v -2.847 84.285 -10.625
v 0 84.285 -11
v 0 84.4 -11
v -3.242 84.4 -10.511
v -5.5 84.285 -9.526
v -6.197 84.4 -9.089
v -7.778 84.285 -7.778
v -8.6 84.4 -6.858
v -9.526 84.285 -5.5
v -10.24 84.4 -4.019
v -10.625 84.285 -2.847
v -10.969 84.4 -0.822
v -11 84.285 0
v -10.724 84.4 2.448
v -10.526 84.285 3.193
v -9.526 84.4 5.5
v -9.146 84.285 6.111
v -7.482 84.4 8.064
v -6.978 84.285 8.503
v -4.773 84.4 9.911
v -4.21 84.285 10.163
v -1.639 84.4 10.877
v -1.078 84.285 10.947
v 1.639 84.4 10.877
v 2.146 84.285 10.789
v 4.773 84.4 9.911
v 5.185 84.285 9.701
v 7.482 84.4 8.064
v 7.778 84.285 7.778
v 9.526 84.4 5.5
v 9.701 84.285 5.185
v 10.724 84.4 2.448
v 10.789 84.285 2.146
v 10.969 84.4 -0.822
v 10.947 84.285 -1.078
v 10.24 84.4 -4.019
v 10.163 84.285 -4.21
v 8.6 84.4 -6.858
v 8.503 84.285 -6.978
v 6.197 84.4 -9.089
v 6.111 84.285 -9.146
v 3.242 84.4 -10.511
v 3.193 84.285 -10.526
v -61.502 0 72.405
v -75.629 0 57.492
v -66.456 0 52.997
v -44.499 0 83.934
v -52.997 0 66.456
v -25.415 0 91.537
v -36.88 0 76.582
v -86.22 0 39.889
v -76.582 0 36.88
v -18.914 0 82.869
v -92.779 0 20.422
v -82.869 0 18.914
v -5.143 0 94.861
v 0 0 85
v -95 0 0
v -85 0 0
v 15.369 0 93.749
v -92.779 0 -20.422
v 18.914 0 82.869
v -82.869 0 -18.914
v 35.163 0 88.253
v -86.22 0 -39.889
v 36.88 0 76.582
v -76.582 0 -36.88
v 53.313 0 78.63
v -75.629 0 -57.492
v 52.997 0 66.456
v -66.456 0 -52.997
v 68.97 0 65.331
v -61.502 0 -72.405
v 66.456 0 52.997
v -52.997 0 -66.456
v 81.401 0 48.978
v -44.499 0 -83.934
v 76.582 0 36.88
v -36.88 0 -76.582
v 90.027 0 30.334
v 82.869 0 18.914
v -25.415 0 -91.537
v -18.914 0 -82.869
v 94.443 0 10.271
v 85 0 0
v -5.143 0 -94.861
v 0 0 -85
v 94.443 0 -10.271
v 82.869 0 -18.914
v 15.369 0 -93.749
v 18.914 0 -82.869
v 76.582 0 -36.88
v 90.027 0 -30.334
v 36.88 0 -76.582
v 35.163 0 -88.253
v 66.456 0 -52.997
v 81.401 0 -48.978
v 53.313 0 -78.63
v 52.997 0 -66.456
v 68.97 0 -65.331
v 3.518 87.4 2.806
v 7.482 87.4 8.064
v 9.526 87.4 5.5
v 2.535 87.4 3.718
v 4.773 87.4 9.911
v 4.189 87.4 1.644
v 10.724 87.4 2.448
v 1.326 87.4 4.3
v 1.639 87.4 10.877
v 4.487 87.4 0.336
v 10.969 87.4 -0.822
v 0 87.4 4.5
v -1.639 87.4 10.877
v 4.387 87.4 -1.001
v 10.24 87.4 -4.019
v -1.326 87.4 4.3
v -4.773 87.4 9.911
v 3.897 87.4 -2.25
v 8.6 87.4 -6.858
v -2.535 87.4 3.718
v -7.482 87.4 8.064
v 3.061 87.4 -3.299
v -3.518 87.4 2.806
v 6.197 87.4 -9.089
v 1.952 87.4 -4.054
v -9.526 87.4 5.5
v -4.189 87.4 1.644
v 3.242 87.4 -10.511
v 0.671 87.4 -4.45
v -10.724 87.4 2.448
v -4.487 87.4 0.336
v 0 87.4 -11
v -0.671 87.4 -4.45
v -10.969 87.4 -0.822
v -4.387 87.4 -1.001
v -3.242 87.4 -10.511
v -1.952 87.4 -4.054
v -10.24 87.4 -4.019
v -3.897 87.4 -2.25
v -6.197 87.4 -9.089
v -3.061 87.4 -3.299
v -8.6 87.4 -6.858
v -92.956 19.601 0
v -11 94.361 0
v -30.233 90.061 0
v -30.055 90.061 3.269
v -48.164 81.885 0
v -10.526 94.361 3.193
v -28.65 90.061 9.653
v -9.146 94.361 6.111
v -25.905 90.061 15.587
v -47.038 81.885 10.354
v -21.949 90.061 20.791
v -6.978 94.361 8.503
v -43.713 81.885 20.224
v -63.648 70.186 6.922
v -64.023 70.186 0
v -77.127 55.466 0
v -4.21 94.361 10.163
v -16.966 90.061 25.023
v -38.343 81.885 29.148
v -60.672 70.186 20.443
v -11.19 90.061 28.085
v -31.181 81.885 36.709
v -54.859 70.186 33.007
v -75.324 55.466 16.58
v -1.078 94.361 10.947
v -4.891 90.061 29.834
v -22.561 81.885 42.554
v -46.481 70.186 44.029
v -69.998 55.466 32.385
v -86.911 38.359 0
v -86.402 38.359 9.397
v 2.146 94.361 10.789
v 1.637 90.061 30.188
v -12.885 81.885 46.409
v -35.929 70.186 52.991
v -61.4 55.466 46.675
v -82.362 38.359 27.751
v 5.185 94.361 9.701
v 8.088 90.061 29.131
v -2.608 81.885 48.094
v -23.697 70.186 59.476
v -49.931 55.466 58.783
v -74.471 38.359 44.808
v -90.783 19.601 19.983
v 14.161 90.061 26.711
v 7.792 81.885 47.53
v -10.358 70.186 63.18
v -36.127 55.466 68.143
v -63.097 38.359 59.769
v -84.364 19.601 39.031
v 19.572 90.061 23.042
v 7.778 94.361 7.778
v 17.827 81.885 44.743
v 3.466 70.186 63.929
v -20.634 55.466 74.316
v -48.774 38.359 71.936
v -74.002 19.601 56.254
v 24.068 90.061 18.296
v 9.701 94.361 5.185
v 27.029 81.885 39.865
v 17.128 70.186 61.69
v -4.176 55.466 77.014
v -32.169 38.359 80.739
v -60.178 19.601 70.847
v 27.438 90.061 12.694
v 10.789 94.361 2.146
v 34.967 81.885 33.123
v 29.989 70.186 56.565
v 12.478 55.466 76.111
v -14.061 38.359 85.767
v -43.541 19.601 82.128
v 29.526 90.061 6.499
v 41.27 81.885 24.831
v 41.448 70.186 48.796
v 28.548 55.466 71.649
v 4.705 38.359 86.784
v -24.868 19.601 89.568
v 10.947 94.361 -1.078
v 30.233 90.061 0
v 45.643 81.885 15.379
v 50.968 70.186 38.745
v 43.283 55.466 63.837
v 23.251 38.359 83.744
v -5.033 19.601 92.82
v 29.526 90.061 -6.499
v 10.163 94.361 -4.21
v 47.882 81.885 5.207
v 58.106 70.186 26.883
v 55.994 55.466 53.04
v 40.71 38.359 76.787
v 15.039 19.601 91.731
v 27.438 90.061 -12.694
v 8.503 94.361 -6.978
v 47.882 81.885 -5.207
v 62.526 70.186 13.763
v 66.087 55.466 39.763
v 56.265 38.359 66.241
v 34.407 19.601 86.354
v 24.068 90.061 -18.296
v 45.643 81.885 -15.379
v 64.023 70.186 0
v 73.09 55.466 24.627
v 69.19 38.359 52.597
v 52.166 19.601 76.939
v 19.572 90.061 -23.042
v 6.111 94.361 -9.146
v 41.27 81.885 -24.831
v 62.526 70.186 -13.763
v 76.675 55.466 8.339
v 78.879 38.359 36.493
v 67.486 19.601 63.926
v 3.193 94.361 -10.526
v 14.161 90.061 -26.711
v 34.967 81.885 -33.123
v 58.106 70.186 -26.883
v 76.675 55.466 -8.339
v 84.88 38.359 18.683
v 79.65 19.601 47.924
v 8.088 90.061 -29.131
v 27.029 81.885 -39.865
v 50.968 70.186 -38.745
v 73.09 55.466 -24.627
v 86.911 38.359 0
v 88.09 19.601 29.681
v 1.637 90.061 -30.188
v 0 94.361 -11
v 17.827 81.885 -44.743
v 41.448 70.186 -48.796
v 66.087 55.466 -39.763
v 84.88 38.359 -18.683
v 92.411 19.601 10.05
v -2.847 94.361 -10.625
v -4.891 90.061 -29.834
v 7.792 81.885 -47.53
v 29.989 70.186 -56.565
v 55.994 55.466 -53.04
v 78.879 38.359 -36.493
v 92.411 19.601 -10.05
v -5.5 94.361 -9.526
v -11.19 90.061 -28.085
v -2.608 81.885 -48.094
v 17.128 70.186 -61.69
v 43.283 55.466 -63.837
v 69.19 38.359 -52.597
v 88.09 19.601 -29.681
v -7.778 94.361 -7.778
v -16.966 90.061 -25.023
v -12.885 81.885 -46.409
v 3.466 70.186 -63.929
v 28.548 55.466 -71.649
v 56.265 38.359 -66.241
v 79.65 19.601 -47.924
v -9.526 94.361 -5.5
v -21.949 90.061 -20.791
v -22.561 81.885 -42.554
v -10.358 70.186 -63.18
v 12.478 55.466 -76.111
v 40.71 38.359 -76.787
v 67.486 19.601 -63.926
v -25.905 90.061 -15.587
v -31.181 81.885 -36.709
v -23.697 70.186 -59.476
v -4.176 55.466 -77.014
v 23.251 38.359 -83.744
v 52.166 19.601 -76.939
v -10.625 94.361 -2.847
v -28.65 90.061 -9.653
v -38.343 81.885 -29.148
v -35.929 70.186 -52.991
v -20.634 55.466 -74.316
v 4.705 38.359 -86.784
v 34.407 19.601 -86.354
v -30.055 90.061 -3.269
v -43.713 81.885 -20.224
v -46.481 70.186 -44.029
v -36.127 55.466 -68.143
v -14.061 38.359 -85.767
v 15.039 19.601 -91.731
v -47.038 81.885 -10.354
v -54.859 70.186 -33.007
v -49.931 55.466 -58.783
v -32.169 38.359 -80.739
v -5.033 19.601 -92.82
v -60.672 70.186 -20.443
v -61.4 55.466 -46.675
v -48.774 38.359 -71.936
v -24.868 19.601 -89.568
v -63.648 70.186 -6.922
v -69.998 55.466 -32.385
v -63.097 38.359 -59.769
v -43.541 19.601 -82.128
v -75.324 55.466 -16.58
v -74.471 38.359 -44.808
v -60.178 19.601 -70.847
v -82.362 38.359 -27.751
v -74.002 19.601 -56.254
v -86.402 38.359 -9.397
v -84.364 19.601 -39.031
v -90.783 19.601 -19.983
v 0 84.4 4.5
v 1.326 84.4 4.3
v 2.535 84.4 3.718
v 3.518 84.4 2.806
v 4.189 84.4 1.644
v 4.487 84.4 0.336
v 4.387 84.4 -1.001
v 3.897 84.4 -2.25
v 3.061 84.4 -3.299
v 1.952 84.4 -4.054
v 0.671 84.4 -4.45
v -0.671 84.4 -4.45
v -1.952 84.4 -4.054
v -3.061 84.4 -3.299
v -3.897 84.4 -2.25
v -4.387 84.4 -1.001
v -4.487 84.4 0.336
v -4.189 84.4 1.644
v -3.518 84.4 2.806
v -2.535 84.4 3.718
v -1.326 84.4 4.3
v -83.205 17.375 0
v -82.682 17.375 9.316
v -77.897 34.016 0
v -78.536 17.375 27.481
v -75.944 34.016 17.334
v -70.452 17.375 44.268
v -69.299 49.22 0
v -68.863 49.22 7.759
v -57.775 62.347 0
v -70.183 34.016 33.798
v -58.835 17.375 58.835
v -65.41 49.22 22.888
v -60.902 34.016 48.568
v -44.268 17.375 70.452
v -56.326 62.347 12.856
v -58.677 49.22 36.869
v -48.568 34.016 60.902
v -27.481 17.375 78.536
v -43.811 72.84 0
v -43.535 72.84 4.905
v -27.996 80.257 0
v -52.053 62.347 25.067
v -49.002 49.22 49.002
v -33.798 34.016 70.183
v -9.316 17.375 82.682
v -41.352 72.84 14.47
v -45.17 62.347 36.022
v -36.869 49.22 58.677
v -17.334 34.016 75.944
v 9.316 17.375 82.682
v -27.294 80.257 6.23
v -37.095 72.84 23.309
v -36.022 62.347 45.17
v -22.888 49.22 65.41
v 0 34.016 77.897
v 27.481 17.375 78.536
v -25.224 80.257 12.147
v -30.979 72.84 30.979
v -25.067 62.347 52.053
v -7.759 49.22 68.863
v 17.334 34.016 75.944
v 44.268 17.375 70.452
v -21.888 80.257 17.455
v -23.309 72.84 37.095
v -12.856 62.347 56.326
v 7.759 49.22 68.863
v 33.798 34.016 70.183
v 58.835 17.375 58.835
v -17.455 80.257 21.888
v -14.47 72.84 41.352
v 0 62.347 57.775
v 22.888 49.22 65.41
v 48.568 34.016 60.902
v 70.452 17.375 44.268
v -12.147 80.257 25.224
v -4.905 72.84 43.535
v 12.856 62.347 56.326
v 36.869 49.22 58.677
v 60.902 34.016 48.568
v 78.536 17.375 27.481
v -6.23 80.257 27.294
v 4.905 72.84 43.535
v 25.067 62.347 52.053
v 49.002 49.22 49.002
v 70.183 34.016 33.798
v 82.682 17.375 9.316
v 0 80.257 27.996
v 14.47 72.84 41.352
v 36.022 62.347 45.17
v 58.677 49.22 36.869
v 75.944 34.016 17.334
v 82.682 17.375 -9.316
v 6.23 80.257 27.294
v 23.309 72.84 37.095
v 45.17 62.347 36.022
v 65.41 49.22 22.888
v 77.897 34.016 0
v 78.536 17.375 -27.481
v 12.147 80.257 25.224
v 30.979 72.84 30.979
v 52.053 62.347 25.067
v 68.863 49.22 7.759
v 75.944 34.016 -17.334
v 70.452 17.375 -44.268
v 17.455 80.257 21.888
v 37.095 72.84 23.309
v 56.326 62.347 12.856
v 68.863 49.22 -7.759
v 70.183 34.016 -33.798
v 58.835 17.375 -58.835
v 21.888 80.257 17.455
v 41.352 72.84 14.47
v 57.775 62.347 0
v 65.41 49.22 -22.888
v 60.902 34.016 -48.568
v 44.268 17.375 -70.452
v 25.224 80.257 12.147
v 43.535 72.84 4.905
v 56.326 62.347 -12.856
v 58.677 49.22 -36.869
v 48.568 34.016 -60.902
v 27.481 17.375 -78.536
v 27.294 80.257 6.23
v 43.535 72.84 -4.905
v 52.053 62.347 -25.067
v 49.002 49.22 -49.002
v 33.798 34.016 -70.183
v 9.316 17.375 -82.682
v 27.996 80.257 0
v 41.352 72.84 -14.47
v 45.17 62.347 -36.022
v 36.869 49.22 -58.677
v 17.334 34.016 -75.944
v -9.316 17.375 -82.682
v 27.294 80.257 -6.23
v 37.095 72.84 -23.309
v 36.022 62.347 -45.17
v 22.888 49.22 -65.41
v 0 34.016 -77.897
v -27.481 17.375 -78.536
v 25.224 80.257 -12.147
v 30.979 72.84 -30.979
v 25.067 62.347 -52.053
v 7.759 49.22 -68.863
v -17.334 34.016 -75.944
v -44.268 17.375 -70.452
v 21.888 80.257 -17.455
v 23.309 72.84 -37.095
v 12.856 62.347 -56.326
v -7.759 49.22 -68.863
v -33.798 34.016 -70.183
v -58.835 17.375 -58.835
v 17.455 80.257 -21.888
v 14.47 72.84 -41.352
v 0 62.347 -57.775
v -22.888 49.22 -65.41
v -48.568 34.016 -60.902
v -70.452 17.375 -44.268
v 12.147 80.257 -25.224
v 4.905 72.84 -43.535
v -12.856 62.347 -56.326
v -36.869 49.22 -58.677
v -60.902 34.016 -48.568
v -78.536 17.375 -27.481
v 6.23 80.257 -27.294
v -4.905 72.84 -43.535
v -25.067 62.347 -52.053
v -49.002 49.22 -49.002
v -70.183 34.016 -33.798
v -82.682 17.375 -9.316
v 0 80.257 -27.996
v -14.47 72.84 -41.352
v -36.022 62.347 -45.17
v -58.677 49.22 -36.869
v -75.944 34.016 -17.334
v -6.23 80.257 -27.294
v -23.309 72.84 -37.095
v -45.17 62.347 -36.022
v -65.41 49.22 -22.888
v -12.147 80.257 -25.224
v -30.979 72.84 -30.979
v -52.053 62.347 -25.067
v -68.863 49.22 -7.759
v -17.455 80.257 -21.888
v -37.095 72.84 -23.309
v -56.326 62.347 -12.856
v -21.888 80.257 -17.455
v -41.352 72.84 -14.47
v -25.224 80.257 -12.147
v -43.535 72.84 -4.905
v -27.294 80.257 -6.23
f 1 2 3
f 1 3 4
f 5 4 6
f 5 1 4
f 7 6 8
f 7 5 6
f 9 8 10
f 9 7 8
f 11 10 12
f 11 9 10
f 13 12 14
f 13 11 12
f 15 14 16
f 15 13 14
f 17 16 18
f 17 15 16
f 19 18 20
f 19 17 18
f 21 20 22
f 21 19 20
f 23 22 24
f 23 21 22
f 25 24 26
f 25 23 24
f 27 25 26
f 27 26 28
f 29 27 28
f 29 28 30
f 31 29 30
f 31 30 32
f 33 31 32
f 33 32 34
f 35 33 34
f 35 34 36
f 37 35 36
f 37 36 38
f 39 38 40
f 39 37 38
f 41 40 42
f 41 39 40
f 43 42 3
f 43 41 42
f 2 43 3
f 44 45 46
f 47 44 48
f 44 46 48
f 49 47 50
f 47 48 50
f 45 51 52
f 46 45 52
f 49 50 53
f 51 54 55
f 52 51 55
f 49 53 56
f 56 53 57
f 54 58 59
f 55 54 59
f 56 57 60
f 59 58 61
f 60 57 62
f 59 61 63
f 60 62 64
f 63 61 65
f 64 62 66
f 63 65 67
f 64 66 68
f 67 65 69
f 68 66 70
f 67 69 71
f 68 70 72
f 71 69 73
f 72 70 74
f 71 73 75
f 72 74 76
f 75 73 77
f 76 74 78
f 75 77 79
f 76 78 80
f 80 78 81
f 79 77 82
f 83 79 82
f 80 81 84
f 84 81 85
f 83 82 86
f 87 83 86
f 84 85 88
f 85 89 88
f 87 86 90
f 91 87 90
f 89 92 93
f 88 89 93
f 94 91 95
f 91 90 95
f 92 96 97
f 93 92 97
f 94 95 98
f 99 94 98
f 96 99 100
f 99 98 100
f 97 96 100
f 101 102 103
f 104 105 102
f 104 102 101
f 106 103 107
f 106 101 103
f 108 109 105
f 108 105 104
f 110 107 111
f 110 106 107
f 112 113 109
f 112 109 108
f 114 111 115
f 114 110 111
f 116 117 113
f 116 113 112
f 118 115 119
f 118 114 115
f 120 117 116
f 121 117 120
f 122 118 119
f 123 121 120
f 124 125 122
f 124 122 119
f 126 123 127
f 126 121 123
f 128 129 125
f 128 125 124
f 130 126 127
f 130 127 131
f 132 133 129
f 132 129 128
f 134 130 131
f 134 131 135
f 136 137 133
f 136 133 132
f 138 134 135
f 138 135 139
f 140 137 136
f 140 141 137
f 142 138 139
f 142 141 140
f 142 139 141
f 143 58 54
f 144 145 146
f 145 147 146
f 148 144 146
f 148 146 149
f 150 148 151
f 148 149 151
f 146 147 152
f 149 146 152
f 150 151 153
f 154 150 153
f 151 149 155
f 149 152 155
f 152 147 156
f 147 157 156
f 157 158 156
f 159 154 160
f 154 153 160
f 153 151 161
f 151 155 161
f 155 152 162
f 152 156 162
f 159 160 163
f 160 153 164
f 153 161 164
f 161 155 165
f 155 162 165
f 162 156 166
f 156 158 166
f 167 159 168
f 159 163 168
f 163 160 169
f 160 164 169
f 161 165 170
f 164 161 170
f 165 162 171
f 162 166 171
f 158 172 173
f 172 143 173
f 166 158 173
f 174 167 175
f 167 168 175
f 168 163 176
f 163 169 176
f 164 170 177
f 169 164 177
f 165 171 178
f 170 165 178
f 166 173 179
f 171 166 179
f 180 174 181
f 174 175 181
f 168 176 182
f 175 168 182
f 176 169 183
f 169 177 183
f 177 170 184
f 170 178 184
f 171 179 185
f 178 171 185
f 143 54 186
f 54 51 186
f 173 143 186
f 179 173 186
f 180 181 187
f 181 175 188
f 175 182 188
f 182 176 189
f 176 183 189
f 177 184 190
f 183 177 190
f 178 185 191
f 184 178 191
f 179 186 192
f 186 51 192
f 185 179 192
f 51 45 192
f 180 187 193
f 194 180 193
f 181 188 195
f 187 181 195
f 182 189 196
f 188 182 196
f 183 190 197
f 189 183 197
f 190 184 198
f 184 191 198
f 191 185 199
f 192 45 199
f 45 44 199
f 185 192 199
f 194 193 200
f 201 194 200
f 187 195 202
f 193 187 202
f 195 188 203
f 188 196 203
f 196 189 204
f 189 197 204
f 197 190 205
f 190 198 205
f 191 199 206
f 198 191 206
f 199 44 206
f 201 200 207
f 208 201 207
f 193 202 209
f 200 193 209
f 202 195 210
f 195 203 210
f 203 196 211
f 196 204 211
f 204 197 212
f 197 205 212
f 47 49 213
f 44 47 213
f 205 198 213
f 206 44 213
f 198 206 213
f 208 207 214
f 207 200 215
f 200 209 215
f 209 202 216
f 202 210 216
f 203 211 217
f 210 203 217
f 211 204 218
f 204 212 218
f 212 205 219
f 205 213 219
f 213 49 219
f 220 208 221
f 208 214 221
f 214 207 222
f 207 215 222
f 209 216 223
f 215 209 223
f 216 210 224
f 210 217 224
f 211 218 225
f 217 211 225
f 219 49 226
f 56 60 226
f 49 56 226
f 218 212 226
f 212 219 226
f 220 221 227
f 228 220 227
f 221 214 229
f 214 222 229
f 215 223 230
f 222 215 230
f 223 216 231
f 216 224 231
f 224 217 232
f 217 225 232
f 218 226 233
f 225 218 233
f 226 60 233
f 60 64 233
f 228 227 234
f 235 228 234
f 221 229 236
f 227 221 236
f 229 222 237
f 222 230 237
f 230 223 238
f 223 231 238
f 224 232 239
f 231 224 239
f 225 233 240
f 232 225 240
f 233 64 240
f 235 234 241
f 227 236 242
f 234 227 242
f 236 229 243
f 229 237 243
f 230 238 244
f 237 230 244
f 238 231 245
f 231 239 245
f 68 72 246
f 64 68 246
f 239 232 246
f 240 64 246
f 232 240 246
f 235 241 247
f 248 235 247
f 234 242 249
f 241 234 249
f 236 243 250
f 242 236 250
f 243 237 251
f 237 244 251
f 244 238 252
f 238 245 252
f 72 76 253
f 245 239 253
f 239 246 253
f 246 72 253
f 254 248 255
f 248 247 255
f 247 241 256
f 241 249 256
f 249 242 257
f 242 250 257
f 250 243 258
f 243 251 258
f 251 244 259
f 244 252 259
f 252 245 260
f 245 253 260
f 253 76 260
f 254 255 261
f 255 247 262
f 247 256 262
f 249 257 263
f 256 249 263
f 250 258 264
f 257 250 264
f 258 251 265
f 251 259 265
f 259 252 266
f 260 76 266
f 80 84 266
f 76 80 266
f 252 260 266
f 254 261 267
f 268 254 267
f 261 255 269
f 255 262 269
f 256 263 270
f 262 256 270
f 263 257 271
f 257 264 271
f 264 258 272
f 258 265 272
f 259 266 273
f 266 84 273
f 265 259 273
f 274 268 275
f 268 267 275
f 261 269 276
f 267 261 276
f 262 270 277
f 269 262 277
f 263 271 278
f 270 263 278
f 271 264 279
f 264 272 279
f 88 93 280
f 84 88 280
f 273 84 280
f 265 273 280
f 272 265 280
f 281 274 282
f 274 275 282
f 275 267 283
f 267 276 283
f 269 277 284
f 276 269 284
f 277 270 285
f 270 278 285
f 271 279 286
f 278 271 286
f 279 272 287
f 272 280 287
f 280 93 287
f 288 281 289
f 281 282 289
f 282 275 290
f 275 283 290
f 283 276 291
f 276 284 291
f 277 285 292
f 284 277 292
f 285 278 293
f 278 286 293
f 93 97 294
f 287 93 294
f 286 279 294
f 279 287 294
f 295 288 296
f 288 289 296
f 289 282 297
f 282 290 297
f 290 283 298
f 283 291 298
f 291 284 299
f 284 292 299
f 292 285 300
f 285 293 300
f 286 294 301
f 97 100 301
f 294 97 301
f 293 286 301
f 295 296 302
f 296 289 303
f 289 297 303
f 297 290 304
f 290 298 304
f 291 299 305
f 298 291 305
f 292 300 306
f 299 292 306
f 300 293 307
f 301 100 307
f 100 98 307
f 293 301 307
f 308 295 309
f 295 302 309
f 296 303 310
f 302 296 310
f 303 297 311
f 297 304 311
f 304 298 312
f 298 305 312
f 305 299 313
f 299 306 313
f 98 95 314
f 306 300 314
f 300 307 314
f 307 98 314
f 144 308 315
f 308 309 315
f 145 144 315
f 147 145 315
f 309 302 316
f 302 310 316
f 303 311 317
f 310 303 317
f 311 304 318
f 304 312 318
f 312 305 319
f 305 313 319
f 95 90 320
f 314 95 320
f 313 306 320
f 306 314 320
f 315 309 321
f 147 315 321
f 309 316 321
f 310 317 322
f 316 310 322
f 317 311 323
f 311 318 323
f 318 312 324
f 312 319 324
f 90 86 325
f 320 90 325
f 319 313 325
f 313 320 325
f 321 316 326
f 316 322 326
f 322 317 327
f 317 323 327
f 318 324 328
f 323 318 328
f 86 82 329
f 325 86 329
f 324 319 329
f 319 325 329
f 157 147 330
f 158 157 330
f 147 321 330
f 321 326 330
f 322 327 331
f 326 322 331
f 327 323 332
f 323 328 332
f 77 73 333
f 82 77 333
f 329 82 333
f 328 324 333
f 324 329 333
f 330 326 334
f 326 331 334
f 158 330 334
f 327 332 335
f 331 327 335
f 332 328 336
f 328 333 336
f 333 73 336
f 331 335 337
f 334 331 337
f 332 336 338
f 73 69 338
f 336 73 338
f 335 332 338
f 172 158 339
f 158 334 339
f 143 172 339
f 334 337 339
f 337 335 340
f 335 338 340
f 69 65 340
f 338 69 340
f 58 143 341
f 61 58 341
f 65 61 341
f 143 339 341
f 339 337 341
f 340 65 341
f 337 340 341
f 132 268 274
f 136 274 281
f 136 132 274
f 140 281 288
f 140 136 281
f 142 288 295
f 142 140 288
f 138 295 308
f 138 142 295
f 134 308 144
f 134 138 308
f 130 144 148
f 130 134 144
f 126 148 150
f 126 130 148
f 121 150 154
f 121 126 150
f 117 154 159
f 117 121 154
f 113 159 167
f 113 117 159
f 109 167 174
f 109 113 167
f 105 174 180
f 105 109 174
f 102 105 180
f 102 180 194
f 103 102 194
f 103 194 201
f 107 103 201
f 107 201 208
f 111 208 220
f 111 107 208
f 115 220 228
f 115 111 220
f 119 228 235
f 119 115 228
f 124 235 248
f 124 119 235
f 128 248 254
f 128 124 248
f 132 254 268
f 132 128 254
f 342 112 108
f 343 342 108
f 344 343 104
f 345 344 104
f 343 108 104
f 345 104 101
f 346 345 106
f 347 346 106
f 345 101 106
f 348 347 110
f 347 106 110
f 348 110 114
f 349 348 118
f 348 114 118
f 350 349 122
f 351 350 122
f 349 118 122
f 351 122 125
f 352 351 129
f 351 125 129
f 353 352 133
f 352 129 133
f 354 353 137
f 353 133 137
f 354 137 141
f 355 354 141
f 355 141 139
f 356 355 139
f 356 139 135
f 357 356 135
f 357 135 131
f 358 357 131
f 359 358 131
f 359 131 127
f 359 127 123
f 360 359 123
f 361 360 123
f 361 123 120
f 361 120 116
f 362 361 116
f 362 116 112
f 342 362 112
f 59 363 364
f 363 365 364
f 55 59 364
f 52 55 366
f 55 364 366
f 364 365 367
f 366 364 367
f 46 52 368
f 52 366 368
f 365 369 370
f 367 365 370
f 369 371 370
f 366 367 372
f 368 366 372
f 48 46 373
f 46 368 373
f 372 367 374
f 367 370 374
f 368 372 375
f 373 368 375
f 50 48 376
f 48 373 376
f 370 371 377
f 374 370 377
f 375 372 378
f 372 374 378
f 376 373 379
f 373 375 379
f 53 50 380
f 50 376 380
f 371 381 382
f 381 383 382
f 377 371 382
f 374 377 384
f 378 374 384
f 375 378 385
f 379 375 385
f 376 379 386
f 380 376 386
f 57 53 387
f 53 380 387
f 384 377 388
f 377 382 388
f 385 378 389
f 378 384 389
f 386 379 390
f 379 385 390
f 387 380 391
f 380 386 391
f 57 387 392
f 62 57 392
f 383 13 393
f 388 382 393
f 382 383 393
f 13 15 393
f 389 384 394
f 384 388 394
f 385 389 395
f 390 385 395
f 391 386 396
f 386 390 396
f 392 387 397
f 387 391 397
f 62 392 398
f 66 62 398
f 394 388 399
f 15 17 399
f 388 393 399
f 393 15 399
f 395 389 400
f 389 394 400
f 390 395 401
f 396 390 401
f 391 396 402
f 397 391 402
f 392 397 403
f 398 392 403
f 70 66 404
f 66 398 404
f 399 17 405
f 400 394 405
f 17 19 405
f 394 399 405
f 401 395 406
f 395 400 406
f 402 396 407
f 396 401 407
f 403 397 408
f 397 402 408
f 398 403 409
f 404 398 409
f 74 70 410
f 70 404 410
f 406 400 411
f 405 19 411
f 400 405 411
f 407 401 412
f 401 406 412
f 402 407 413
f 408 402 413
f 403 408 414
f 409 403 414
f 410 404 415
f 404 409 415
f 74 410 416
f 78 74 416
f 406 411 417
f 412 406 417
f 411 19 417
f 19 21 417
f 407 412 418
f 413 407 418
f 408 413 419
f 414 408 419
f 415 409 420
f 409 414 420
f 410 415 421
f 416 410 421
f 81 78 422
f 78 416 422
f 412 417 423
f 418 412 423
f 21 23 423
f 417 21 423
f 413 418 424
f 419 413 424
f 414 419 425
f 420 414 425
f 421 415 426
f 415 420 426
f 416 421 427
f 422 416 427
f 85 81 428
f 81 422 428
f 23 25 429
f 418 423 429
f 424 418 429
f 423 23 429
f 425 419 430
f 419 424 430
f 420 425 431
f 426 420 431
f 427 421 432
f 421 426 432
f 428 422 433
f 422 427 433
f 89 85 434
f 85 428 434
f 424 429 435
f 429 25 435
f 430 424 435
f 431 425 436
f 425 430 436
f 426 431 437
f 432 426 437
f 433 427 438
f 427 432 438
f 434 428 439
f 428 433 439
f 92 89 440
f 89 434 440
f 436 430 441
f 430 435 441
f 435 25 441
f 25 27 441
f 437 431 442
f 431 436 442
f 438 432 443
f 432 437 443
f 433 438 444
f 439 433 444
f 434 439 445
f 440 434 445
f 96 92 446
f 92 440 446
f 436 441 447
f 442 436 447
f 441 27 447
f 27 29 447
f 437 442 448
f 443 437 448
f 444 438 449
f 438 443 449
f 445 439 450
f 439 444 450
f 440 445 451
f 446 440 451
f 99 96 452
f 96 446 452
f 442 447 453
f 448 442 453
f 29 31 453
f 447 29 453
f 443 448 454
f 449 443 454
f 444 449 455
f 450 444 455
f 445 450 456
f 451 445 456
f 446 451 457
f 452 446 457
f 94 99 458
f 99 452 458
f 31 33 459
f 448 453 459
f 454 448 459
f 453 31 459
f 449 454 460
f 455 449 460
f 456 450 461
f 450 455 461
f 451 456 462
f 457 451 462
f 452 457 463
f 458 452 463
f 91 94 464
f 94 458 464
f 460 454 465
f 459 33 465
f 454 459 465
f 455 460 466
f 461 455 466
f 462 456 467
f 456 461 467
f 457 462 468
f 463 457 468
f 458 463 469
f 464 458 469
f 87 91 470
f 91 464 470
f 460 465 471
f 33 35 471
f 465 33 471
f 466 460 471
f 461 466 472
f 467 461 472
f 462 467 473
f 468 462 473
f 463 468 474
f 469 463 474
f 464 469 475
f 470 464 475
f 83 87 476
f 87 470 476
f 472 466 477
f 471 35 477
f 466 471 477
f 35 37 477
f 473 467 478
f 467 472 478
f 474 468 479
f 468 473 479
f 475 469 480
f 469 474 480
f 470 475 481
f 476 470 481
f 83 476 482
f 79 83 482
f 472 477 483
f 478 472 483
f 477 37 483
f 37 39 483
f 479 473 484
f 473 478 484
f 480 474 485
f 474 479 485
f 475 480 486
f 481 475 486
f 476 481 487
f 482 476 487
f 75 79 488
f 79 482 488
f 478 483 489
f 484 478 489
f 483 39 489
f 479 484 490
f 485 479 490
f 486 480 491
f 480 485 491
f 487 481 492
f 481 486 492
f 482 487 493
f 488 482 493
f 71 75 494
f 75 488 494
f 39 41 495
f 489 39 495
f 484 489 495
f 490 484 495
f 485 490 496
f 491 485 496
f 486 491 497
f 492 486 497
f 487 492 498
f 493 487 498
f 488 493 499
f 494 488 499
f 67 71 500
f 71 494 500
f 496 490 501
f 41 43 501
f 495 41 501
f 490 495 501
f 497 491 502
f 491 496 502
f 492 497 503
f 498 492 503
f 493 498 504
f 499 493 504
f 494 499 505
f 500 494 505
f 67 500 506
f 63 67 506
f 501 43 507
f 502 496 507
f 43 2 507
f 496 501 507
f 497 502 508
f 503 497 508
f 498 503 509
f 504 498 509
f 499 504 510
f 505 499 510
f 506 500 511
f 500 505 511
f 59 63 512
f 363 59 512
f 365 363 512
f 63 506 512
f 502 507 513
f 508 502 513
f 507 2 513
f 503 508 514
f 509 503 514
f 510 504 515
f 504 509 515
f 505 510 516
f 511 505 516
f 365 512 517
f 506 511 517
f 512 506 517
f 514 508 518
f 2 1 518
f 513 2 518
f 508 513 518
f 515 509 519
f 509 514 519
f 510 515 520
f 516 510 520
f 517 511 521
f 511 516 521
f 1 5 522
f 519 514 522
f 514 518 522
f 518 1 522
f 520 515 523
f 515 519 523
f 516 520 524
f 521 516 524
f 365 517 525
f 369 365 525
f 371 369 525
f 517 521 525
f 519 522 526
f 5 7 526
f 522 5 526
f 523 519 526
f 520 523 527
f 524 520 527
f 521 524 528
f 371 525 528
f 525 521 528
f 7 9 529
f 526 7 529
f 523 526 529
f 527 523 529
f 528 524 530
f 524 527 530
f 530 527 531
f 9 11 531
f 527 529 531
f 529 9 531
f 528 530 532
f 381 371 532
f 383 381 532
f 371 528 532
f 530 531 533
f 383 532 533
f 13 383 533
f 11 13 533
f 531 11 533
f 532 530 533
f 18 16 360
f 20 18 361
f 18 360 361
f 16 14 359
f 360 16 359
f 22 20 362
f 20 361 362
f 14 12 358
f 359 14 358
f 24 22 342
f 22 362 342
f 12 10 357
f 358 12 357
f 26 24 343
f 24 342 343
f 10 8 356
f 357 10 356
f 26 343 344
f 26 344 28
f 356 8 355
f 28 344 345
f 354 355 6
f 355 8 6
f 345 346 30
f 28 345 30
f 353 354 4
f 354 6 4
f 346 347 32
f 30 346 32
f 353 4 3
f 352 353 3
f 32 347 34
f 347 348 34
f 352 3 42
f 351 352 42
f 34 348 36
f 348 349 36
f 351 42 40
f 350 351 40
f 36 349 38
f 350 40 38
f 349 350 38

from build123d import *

# Parameters (mm, degrees)
SKETCH2_W              = 242.645613954
SKETCH2_H              = 231.138030636
CUT_IN_HALF_DEPTH      = 165.544826719
SKETCH3_R              = 11
BALLBEARINGHOLE_DEPTH  = 165.544826719
SKETCH4_R              = 31.202879122
SUPPORTFORHOLE_DEPTH   = 4
F_2NDBEARINGHOLE_START = -7
SKETCH5_R              = 11
F_2NDBEARINGHOLE_DEPTH = 7
SKETCH6_R              = 4.5
INSIDEHOLE_DEPTH       = 161.277134988


with BuildPart() as part:
    # Half Circle → Sphere Revolve (revolve)
    with BuildSketch(Plane.XY):
        with BuildLine():
            Line((0, 85), (0, 95))
            ThreePointArc((0, 95), (-95, 0), (0, -95))
            Line((0, -95), (0, -85))
            ThreePointArc((0, -85), (-85, 0), (0, 85))
        make_face()
    revolve(axis=Axis((0, 85, 0), (0, 1, 0)))

    # Sketch2 → Cut in Half (cut, through all)
    with BuildSketch(Plane(origin=(0, 0, 0), x_dir=(1, 0, 0), z_dir=(0, 1, 0))):
        Rectangle(SKETCH2_W, SKETCH2_H)
    extrude(amount=-CUT_IN_HALF_DEPTH, mode=Mode.SUBTRACT)

    # Sketch3 → BallBearingHole (cut, through all)
    with BuildSketch(Plane(origin=(0, 0, 0), x_dir=(1, 0, 0), z_dir=(0, 1, 0))):
        with Locations(Location((0, 0, 0), (0, 0, 90))):
            Circle(SKETCH3_R)
    extrude(amount=BALLBEARINGHOLE_DEPTH, mode=Mode.SUBTRACT)

    # Sketch4 → SupportForHole (add)
    with BuildSketch(Plane(origin=(0, 84.4, 0), x_dir=(1, 0, 0), z_dir=(0, 1, 0))):
        Circle(SKETCH4_R)
    extrude(amount=SUPPORTFORHOLE_DEPTH)

    # Sketch5 → 2ndBearingHole (cut)
    with BuildSketch(Plane(origin=(0, 94.4, 0), x_dir=(1, 0, 0), z_dir=(0, 1, 0)).offset(F_2NDBEARINGHOLE_START)):
        with Locations(Location((0, 0, 0), (0, 0, 90))):
            Circle(SKETCH5_R)
    extrude(amount=F_2NDBEARINGHOLE_DEPTH, mode=Mode.SUBTRACT)

    # Sketch6 → InsideHole (cut, through all)
    with BuildSketch(Plane(origin=(0, 87.4, 0), x_dir=(1, 0, 0), z_dir=(0, 1, 0))):
        with Locations(Location((0, 0, 0), (0, 0, 270))):
            Circle(SKETCH6_R)
    extrude(amount=-INSIDEHOLE_DEPTH, mode=Mode.SUBTRACT)


solid = part.part
